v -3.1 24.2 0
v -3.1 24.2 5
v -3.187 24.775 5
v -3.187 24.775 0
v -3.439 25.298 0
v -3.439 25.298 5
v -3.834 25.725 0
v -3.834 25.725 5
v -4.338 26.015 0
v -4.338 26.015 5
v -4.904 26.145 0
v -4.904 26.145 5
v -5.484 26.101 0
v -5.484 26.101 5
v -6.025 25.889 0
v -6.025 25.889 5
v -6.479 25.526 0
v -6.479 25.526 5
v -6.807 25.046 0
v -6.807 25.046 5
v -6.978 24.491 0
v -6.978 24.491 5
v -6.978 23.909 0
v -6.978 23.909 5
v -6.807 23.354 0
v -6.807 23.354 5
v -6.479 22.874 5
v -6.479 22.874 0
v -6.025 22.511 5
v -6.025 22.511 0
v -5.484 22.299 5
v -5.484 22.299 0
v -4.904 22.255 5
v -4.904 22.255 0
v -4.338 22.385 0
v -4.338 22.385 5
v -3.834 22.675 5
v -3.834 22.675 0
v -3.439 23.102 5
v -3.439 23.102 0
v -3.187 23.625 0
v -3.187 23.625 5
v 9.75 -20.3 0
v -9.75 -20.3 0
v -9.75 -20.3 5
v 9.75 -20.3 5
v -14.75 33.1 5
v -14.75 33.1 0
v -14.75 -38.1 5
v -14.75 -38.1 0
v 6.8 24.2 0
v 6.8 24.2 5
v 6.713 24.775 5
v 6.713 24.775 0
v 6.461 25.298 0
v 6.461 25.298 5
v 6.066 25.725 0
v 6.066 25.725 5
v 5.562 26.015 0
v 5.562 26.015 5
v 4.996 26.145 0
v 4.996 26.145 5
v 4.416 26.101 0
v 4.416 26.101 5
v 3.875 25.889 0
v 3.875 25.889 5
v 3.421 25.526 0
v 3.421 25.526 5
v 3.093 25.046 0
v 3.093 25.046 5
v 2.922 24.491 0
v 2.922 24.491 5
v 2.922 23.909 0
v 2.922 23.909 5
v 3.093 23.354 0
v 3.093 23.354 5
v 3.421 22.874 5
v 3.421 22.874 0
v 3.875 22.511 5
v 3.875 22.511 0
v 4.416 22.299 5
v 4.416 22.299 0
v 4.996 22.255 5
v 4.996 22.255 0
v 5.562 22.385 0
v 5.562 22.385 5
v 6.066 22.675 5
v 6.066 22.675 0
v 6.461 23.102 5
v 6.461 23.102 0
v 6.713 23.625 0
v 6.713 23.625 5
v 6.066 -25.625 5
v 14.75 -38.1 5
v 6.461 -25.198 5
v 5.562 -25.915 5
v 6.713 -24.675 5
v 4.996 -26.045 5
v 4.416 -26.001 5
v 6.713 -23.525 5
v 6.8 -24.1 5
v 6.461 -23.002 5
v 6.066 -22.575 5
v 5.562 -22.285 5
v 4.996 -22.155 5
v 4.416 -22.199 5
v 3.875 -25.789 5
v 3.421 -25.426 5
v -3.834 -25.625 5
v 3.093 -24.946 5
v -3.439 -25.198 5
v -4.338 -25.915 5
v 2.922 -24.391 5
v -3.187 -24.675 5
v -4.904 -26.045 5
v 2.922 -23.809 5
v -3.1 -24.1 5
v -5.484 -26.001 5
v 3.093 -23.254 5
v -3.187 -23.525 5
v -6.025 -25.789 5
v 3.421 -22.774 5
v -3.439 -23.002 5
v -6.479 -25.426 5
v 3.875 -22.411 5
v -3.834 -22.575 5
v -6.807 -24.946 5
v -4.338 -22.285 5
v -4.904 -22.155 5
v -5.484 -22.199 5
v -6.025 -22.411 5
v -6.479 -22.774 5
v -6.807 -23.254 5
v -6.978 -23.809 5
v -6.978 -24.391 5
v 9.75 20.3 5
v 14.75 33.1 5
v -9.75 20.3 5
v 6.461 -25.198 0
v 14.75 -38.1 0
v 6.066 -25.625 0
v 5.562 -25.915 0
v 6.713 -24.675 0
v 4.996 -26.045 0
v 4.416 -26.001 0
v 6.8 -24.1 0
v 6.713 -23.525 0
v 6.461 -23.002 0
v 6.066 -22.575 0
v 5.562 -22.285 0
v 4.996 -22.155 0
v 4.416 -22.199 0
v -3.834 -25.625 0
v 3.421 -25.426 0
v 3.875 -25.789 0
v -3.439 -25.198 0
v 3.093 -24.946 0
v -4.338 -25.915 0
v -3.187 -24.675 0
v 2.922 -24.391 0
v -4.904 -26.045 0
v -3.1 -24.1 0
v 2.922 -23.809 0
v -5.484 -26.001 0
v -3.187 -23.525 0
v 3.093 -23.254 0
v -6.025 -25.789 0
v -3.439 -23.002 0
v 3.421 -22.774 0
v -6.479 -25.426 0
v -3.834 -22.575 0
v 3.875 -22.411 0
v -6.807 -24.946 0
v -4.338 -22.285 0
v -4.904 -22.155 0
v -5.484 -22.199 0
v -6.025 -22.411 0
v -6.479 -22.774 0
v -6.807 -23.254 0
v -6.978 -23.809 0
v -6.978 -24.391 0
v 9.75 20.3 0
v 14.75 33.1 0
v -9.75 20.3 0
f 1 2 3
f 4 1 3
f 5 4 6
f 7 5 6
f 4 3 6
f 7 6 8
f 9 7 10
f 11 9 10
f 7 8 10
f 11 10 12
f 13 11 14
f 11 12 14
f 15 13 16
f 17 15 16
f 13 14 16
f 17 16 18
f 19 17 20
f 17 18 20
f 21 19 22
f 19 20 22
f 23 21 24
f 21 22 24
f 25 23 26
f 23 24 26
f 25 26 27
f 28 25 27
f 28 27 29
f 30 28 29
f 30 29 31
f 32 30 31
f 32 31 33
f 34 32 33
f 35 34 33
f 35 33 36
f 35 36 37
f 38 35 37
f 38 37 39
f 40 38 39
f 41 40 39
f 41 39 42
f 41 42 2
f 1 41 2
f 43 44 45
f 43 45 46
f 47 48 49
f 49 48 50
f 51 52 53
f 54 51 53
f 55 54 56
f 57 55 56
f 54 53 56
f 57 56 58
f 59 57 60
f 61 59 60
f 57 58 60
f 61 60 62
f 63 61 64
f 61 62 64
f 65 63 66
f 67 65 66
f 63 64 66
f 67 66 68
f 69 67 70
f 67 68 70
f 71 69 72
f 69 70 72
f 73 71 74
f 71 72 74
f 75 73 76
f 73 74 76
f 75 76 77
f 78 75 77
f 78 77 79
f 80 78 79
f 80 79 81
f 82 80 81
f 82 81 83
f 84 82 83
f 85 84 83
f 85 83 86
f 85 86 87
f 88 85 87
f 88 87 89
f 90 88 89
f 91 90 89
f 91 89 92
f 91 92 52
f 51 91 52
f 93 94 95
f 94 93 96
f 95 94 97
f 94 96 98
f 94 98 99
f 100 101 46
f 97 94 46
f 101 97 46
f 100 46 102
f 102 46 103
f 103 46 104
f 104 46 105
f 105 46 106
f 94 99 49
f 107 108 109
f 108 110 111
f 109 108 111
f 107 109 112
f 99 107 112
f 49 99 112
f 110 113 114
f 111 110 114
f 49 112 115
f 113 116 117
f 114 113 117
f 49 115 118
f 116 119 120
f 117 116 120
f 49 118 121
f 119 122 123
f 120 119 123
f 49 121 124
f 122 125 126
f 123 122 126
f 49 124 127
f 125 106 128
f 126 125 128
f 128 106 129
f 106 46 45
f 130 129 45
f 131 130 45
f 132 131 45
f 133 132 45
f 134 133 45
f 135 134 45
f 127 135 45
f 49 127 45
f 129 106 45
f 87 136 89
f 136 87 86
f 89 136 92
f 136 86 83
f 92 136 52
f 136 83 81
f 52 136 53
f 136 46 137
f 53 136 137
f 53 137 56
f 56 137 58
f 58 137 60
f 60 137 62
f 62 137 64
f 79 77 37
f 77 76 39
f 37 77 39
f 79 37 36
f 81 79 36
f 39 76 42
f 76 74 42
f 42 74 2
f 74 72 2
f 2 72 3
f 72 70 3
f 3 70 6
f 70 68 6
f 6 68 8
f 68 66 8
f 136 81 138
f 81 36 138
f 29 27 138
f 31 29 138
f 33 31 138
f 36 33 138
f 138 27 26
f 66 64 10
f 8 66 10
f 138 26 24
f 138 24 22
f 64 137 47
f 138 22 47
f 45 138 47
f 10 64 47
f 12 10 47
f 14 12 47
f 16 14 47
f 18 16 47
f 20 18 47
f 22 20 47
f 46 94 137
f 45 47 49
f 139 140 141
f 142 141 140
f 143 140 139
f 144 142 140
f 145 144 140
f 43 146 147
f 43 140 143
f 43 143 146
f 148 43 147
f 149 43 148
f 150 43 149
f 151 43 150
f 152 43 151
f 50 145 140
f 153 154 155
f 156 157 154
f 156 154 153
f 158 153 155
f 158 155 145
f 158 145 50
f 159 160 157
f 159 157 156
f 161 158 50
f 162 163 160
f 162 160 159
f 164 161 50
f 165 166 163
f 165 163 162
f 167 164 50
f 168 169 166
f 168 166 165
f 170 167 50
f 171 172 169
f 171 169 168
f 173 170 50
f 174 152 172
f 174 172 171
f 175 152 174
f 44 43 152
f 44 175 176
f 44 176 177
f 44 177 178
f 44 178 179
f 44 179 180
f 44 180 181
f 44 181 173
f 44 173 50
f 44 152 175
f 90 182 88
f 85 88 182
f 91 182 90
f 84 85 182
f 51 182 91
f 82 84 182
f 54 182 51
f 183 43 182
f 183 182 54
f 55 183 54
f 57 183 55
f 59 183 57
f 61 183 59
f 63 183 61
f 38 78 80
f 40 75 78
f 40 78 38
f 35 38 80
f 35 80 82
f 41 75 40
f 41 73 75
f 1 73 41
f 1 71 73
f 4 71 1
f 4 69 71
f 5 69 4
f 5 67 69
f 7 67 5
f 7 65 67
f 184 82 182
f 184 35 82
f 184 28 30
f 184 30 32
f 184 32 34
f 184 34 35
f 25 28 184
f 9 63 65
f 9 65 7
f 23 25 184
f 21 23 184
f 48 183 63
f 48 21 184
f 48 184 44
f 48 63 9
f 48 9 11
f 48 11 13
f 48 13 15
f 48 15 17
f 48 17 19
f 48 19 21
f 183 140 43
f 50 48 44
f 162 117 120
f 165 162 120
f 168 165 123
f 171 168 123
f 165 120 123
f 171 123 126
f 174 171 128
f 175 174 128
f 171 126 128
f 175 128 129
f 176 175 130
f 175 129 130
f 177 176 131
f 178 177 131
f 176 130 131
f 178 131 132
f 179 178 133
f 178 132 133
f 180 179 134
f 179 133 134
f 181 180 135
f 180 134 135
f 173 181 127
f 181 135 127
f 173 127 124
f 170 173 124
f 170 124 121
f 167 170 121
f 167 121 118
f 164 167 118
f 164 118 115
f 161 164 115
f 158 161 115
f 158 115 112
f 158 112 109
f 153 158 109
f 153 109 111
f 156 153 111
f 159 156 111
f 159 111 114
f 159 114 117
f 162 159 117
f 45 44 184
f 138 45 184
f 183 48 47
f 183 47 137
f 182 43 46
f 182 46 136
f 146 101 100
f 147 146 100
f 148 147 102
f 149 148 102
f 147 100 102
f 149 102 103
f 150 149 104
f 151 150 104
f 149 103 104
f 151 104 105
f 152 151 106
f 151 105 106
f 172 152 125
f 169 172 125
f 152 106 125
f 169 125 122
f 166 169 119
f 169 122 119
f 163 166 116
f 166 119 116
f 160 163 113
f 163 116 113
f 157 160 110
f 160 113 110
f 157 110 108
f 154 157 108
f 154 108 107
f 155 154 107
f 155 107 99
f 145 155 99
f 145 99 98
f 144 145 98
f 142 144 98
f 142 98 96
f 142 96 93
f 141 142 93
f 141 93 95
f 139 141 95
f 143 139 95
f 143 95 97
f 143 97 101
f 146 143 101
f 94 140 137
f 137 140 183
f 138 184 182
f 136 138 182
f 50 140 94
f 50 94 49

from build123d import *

# Parameters (mm, degrees)
CROQUIS1_W              = 19.5
CROQUIS1_H              = 40.6
SALIENTE_EXTRUIR2_DEPTH = 5
CROQUIS3_R              = 1.95
CORTAR_EXTRUIR1_DEPTH   = 10


with BuildPart() as part:
    # Croquis1 → Saliente-Extruir2 (new body)
    with BuildSketch(Plane.XY):
        Polygon((-14.75, 33.1), (14.75, 33.1), (14.75, 0), (14.75, -38.1), (-14.75, -38.1), (-14.75, 0), align=None)
        Rectangle(CROQUIS1_W, CROQUIS1_H, mode=Mode.SUBTRACT)
    extrude(amount=SALIENTE_EXTRUIR2_DEPTH)

    # Croquis3 → Cortar-Extruir1 (cut)
    with BuildSketch(Plane.XY.offset(5)):
        with Locations((-5.05, 24.2)):
            Circle(CROQUIS3_R)
        with Locations((4.85, 24.2)):
            Circle(CROQUIS3_R)
        with Locations((-5.05, -24.1)):
            Circle(CROQUIS3_R)
        with Locations((4.85, -24.1)):
            Circle(CROQUIS3_R)
    extrude(amount=-CORTAR_EXTRUIR1_DEPTH, mode=Mode.SUBTRACT)


solid = part.part
